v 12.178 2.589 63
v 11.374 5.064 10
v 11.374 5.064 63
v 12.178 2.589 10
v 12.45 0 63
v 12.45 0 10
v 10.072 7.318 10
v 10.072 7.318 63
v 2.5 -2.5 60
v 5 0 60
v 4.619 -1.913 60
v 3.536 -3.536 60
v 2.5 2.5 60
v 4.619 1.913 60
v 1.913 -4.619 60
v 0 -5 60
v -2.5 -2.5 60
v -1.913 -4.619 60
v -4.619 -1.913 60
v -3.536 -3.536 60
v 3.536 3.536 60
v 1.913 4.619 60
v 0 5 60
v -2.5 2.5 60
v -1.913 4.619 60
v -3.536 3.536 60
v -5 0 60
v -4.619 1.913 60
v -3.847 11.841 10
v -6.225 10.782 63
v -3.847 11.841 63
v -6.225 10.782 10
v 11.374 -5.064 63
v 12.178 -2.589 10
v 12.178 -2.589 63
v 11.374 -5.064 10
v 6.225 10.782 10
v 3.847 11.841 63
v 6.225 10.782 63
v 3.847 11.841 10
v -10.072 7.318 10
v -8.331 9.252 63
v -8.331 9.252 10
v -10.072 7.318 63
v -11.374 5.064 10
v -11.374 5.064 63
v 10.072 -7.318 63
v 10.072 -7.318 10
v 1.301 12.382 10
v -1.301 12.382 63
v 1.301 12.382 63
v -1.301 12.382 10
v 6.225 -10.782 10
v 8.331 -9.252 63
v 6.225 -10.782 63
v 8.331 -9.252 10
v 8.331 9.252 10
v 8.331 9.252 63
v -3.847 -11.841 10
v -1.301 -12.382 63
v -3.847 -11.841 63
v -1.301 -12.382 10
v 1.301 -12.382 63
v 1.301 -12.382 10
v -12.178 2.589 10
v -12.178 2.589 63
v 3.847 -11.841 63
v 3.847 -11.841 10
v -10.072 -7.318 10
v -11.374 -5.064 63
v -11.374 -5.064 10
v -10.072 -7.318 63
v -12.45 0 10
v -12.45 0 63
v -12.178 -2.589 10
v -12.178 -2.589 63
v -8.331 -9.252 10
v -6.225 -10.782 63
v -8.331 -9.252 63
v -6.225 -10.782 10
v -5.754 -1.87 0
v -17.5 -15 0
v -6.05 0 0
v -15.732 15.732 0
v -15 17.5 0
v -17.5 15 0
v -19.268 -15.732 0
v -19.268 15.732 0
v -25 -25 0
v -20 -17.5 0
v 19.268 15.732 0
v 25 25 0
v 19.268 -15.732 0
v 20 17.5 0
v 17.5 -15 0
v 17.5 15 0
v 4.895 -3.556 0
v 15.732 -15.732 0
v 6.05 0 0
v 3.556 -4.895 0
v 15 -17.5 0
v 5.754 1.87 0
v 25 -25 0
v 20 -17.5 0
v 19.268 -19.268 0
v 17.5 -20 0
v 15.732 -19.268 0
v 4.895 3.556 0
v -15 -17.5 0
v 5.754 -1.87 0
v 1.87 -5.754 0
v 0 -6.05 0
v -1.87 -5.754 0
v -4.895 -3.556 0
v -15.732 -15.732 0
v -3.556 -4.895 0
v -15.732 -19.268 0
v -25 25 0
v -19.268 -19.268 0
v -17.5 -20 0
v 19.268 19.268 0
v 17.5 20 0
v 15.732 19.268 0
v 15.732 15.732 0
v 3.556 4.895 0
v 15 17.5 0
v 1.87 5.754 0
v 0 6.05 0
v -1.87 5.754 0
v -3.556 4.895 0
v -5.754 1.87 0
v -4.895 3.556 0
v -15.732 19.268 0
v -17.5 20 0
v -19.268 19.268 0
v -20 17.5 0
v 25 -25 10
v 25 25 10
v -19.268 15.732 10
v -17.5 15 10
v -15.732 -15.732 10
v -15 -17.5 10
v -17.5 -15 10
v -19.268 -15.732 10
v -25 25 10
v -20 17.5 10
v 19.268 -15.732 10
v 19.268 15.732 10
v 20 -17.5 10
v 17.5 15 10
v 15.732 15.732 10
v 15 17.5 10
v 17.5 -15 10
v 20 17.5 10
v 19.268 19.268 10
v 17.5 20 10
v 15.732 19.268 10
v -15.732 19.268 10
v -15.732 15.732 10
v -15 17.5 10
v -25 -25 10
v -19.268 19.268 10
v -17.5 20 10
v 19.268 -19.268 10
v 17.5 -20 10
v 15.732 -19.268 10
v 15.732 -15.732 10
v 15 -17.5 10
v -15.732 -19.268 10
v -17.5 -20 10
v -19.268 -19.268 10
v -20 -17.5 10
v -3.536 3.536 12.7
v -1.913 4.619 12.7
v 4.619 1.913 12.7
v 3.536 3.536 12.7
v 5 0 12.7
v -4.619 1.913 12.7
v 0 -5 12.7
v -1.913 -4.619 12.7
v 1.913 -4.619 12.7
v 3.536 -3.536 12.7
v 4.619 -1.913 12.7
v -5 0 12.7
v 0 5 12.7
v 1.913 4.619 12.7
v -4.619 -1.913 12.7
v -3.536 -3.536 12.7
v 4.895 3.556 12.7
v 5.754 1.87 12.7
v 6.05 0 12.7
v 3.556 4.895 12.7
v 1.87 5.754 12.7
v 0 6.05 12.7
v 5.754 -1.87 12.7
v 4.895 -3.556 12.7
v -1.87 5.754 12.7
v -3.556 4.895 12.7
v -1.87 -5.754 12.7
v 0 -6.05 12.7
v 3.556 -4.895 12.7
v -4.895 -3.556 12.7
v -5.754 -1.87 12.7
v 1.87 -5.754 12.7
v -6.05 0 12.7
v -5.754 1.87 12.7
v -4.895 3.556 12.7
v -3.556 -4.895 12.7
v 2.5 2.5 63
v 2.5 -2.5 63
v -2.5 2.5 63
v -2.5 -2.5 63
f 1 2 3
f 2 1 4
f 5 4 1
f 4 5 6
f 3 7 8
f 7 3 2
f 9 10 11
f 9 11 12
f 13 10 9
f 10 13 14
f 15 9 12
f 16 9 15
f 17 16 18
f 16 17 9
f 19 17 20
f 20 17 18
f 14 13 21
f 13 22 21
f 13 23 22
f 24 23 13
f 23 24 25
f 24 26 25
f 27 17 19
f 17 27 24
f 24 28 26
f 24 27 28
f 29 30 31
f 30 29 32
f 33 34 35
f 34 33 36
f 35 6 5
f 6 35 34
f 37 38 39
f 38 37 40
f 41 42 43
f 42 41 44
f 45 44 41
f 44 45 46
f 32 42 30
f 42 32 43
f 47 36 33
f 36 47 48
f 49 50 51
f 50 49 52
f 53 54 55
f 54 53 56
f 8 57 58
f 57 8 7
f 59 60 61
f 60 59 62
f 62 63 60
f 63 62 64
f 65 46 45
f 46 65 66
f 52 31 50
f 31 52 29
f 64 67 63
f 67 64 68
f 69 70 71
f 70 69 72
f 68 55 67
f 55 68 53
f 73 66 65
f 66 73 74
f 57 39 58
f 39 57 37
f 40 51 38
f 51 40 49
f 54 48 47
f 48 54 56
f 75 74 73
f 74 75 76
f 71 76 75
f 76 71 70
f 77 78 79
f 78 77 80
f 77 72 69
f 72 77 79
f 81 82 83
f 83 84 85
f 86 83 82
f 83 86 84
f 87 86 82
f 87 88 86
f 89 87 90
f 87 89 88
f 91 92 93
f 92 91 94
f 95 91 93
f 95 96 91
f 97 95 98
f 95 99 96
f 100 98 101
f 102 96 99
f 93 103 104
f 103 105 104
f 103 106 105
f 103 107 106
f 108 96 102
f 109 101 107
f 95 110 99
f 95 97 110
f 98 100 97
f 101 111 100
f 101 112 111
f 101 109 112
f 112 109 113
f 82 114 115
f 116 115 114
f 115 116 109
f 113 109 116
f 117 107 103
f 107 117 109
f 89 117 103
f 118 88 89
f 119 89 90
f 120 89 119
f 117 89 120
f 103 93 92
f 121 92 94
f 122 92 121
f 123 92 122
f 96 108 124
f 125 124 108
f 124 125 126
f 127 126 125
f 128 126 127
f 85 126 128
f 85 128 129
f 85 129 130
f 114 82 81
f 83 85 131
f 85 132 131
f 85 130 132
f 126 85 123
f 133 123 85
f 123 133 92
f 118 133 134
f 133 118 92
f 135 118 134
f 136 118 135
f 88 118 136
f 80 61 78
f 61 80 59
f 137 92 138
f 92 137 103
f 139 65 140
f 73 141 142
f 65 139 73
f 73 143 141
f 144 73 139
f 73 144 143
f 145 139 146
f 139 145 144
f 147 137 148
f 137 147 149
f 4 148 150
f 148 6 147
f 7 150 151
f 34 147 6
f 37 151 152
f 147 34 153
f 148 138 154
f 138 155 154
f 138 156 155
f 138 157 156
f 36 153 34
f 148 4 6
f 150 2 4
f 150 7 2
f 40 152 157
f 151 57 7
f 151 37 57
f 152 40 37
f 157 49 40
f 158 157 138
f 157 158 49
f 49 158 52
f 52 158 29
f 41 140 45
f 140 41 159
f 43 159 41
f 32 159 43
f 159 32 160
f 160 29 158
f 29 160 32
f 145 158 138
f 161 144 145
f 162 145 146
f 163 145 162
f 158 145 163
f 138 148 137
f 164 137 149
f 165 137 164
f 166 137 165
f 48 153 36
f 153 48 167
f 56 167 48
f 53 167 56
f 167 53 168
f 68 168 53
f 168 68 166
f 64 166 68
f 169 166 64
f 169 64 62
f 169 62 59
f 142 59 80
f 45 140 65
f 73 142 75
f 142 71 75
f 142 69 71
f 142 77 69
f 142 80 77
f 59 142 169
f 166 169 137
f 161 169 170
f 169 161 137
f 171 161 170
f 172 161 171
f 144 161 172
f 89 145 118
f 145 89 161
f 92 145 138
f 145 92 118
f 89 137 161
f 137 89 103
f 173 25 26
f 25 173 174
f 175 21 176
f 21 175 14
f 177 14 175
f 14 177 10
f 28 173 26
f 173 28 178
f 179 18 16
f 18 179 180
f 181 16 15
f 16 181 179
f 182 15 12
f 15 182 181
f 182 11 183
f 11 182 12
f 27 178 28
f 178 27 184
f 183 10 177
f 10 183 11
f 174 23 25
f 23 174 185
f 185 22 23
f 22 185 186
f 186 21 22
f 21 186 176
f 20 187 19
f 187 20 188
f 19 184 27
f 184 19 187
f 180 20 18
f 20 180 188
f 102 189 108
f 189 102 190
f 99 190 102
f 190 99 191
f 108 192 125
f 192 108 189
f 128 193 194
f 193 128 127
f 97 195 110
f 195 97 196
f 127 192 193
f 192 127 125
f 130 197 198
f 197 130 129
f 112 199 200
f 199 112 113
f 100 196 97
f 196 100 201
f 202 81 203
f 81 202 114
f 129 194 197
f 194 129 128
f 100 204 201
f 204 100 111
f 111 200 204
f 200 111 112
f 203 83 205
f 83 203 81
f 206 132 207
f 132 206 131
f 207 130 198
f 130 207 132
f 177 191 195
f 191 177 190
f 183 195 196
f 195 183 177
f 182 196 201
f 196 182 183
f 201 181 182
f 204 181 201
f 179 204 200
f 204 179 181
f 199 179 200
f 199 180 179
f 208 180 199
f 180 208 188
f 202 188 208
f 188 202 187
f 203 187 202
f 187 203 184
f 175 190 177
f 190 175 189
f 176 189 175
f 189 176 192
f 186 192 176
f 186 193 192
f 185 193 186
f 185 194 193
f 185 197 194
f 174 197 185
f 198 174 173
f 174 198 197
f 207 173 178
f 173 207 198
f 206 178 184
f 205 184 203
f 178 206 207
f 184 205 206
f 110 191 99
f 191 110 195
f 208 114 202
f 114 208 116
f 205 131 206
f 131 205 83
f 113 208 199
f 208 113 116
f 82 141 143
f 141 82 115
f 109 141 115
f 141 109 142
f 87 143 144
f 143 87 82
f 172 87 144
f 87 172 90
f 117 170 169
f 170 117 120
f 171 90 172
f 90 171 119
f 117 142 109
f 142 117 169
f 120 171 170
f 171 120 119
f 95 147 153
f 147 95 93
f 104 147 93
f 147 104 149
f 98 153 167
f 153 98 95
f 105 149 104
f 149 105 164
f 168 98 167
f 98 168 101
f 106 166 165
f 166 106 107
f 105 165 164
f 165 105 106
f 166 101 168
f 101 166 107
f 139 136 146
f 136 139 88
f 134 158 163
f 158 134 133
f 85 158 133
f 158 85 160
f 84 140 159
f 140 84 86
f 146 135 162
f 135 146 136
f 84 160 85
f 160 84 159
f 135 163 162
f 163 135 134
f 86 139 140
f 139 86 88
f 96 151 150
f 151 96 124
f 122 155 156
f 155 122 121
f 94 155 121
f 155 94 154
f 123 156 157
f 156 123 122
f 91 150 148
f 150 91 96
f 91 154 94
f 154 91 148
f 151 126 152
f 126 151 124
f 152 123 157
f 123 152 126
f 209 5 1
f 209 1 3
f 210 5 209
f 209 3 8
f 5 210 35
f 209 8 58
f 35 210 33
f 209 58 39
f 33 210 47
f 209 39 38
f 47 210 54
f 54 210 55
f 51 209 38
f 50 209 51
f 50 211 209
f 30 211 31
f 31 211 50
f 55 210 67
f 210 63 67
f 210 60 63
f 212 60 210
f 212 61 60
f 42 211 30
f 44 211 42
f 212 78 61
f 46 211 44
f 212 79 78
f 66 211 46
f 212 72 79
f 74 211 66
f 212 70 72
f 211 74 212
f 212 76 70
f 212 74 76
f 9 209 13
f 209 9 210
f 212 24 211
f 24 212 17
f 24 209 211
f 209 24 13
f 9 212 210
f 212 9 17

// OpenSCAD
// file: optics_thingy_body.scad
// units in mm
// optics light tube for Akash

// editable
post_diameter_nominal = 25;
post_d_fudge = -0.1;

post_height = 60;

platexy = 50;
plate_t = 10;
inner_d = 10;

colm_diameter_nominal = 12;
colm_d_fudge = 0.1;
colm_h = 12.7;

mount_hole_d = 5;
hole_offset = 15;

// calculated
post_d = post_diameter_nominal + post_d_fudge;
colm_d = colm_diameter_nominal + colm_d_fudge;
holexy = platexy - hole_offset;

module body(){
    // geometry
    difference(){
        union(){
            cylinder(d=post_d, h=post_height);
            translate([0,0,plate_t/2]) cube([platexy, platexy, plate_t],center=true);
        }
        cylinder(d=inner_d, h=post_height);
        cylinder(d=colm_d, h=colm_h);
        
        translate([-holexy/2,-holexy/2,0]) cylinder(d=mount_hole_d, h=plate_t);
        translate([ holexy/2,-holexy/2,0]) cylinder(d=mount_hole_d, h=plate_t);
        translate([-holexy/2, holexy/2,0]) cylinder(d=mount_hole_d, h=plate_t);
        translate([ holexy/2, holexy/2,0]) cylinder(d=mount_hole_d, h=plate_t);
    }
}

body();
// main file
include <optics_thingy_body.scad>

aper_t = 3;
aperxy = 5;

translate([0,0,post_height]) difference(){
    cylinder(d=post_d,h=aper_t);
    translate([0,0,aper_t/2]) cube([aperxy, aperxy, aper_t], center=true);
}
//body();
